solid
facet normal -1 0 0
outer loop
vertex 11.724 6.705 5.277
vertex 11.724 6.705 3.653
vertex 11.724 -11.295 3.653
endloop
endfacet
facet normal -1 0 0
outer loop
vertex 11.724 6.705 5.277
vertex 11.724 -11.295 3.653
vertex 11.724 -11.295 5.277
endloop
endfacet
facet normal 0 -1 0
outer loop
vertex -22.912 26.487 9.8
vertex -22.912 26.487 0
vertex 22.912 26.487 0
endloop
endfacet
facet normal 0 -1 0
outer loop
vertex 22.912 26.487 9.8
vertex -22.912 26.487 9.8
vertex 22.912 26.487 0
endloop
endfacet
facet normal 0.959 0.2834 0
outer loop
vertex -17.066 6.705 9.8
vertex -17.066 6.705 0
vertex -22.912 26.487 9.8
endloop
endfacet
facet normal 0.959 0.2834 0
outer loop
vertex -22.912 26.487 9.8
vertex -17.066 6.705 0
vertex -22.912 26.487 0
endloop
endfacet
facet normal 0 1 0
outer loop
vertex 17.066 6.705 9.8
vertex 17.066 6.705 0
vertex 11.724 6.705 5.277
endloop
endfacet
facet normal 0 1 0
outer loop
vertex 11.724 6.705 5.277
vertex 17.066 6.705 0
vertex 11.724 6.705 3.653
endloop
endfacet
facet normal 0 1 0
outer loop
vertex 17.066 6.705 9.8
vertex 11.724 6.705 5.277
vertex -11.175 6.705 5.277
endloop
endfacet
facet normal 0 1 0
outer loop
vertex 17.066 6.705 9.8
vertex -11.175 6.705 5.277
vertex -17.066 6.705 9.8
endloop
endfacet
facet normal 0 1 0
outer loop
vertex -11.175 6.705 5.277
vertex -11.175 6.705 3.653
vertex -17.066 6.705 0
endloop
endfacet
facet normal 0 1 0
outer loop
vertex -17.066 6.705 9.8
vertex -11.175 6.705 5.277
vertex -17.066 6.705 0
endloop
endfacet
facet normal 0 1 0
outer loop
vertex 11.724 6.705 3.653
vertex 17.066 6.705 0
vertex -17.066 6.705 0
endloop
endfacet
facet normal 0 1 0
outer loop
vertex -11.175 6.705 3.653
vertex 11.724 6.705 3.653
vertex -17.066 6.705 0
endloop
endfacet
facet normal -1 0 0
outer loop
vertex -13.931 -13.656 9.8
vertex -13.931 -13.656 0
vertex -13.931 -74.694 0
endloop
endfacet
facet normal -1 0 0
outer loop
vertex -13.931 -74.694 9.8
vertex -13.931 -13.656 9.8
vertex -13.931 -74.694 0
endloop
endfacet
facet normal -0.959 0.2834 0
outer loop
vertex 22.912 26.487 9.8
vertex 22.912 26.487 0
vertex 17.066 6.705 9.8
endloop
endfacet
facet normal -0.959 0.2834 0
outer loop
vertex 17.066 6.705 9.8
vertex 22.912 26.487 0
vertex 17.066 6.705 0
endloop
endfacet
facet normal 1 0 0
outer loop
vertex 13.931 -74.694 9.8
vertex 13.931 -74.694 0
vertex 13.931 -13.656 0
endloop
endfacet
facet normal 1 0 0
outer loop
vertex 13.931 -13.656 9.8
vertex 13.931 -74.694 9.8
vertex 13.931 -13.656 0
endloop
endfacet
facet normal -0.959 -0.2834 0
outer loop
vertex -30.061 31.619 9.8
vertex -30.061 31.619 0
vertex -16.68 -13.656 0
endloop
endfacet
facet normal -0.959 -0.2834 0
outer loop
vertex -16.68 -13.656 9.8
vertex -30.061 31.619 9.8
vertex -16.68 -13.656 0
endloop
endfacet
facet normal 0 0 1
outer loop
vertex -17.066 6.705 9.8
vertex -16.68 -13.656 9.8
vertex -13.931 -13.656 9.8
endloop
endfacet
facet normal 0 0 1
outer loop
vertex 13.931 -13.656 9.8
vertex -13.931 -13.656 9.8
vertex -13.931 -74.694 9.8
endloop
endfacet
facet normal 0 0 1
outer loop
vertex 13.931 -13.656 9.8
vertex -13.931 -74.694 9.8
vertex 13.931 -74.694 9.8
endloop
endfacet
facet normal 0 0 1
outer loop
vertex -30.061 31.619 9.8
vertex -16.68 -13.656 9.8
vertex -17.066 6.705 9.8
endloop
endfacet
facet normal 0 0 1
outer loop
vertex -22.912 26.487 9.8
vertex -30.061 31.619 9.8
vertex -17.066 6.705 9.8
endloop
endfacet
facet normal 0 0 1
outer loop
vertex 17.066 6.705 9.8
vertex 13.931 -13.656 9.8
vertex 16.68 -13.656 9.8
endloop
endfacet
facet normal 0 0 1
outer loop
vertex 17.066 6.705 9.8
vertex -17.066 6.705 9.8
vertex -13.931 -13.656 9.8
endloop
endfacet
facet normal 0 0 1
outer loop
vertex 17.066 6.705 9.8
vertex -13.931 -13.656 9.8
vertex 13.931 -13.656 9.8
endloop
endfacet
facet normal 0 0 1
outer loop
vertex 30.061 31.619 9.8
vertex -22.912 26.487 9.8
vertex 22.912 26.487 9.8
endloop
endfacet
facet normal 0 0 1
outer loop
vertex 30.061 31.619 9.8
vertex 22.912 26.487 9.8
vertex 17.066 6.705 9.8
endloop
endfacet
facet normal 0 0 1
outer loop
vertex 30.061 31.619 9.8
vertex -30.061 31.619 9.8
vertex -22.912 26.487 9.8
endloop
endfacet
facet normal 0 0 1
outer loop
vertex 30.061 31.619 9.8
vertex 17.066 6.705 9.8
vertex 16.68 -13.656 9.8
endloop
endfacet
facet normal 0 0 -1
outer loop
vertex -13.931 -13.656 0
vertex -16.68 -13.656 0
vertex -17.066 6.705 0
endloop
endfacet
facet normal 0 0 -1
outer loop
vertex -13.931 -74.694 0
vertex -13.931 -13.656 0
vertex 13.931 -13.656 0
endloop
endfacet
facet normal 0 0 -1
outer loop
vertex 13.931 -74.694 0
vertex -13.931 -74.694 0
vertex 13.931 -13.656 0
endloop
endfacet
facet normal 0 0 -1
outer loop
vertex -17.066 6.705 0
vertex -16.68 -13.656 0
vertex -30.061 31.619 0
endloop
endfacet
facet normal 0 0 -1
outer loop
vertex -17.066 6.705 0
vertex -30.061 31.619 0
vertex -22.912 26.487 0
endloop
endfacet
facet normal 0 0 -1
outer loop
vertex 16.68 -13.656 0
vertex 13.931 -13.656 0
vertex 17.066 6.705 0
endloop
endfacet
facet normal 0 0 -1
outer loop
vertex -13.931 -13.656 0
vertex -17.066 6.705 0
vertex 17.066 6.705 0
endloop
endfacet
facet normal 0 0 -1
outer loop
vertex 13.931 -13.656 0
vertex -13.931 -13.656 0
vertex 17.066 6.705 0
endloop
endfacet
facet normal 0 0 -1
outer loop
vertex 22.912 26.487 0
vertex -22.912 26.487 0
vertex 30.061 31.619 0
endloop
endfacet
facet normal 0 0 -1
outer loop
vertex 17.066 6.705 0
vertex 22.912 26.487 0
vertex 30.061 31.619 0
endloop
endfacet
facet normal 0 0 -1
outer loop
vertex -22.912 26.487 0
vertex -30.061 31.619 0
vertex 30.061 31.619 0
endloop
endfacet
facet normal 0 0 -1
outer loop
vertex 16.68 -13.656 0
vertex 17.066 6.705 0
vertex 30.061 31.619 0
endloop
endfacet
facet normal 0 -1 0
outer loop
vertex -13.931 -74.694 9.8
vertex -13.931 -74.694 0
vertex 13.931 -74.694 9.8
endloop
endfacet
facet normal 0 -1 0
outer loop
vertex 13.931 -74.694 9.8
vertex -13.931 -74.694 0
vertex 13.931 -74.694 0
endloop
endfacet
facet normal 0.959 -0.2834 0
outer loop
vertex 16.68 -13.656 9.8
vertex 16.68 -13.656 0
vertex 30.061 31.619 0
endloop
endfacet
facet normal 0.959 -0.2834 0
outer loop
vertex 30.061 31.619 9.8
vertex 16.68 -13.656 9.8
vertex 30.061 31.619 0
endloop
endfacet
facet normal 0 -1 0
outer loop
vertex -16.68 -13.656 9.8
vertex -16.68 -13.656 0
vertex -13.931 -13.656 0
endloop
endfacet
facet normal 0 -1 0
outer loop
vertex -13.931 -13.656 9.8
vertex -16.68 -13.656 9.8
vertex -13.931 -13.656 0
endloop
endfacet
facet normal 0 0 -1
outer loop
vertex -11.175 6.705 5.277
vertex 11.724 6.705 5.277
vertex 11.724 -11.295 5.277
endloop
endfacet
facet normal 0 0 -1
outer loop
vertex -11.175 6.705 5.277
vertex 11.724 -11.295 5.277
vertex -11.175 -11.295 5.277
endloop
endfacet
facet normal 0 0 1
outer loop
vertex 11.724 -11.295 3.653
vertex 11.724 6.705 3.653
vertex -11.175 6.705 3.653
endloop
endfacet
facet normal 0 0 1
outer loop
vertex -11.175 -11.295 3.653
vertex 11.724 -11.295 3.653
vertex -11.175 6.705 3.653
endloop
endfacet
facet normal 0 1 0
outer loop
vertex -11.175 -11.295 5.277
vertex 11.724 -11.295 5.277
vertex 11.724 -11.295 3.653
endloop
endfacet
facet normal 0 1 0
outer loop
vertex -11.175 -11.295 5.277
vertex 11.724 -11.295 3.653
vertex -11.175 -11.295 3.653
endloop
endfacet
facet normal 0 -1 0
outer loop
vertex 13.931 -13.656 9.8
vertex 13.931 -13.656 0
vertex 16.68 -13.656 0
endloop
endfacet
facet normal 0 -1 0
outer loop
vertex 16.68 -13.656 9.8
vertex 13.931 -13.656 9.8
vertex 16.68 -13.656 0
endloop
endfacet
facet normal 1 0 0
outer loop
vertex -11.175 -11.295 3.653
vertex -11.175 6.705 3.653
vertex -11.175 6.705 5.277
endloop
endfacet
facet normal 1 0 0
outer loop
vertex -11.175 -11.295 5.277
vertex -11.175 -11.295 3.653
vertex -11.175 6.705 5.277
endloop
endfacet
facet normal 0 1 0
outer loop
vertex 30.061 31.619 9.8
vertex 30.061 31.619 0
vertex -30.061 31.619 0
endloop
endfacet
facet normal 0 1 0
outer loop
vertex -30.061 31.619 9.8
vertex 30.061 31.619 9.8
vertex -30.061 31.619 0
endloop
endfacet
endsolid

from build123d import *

# Parameters (mm, degrees)
F1_DEPTH = 9.8
F2_W     = 22.898962
F2_H     = 1.623713
F3_DEPTH = 18


with BuildPart() as f1:
    # F0 (on Top) → F1 (new body)
    with BuildSketch(Plane.XY):
        Polygon((30.061033, 31.619072), (-30.061033, 31.619072), (-16.680207, -13.655773), (-13.930722, -13.655773), (0, -13.655773), (13.930722, -13.655773), (16.680207, -13.655773), align=None)
        Polygon((-17.066102, 6.705488), (-22.912372, 26.4867), (22.912372, 26.4867), (17.066102, 6.705488), (0, 6.705488), align=None, mode=Mode.SUBTRACT)
        Polygon((0, -13.655773), (-13.930722, -13.655773), (-13.930722, -74.694335), (0, -74.694335), (13.930722, -74.694335), (13.930722, -13.655773), align=None)
    extrude(amount=F1_DEPTH)

    # F2 (on face) → F3 (cut)
    with BuildSketch(Plane(origin=(0, 6.705488, 0), x_dir=(-1, 0, 0), z_dir=(0, 1, 0))):
        with Locations((-0.274213, 4.465245)):
            Rectangle(F2_W, F2_H)
    extrude(amount=-F3_DEPTH, mode=Mode.SUBTRACT)


solid = f1.part
